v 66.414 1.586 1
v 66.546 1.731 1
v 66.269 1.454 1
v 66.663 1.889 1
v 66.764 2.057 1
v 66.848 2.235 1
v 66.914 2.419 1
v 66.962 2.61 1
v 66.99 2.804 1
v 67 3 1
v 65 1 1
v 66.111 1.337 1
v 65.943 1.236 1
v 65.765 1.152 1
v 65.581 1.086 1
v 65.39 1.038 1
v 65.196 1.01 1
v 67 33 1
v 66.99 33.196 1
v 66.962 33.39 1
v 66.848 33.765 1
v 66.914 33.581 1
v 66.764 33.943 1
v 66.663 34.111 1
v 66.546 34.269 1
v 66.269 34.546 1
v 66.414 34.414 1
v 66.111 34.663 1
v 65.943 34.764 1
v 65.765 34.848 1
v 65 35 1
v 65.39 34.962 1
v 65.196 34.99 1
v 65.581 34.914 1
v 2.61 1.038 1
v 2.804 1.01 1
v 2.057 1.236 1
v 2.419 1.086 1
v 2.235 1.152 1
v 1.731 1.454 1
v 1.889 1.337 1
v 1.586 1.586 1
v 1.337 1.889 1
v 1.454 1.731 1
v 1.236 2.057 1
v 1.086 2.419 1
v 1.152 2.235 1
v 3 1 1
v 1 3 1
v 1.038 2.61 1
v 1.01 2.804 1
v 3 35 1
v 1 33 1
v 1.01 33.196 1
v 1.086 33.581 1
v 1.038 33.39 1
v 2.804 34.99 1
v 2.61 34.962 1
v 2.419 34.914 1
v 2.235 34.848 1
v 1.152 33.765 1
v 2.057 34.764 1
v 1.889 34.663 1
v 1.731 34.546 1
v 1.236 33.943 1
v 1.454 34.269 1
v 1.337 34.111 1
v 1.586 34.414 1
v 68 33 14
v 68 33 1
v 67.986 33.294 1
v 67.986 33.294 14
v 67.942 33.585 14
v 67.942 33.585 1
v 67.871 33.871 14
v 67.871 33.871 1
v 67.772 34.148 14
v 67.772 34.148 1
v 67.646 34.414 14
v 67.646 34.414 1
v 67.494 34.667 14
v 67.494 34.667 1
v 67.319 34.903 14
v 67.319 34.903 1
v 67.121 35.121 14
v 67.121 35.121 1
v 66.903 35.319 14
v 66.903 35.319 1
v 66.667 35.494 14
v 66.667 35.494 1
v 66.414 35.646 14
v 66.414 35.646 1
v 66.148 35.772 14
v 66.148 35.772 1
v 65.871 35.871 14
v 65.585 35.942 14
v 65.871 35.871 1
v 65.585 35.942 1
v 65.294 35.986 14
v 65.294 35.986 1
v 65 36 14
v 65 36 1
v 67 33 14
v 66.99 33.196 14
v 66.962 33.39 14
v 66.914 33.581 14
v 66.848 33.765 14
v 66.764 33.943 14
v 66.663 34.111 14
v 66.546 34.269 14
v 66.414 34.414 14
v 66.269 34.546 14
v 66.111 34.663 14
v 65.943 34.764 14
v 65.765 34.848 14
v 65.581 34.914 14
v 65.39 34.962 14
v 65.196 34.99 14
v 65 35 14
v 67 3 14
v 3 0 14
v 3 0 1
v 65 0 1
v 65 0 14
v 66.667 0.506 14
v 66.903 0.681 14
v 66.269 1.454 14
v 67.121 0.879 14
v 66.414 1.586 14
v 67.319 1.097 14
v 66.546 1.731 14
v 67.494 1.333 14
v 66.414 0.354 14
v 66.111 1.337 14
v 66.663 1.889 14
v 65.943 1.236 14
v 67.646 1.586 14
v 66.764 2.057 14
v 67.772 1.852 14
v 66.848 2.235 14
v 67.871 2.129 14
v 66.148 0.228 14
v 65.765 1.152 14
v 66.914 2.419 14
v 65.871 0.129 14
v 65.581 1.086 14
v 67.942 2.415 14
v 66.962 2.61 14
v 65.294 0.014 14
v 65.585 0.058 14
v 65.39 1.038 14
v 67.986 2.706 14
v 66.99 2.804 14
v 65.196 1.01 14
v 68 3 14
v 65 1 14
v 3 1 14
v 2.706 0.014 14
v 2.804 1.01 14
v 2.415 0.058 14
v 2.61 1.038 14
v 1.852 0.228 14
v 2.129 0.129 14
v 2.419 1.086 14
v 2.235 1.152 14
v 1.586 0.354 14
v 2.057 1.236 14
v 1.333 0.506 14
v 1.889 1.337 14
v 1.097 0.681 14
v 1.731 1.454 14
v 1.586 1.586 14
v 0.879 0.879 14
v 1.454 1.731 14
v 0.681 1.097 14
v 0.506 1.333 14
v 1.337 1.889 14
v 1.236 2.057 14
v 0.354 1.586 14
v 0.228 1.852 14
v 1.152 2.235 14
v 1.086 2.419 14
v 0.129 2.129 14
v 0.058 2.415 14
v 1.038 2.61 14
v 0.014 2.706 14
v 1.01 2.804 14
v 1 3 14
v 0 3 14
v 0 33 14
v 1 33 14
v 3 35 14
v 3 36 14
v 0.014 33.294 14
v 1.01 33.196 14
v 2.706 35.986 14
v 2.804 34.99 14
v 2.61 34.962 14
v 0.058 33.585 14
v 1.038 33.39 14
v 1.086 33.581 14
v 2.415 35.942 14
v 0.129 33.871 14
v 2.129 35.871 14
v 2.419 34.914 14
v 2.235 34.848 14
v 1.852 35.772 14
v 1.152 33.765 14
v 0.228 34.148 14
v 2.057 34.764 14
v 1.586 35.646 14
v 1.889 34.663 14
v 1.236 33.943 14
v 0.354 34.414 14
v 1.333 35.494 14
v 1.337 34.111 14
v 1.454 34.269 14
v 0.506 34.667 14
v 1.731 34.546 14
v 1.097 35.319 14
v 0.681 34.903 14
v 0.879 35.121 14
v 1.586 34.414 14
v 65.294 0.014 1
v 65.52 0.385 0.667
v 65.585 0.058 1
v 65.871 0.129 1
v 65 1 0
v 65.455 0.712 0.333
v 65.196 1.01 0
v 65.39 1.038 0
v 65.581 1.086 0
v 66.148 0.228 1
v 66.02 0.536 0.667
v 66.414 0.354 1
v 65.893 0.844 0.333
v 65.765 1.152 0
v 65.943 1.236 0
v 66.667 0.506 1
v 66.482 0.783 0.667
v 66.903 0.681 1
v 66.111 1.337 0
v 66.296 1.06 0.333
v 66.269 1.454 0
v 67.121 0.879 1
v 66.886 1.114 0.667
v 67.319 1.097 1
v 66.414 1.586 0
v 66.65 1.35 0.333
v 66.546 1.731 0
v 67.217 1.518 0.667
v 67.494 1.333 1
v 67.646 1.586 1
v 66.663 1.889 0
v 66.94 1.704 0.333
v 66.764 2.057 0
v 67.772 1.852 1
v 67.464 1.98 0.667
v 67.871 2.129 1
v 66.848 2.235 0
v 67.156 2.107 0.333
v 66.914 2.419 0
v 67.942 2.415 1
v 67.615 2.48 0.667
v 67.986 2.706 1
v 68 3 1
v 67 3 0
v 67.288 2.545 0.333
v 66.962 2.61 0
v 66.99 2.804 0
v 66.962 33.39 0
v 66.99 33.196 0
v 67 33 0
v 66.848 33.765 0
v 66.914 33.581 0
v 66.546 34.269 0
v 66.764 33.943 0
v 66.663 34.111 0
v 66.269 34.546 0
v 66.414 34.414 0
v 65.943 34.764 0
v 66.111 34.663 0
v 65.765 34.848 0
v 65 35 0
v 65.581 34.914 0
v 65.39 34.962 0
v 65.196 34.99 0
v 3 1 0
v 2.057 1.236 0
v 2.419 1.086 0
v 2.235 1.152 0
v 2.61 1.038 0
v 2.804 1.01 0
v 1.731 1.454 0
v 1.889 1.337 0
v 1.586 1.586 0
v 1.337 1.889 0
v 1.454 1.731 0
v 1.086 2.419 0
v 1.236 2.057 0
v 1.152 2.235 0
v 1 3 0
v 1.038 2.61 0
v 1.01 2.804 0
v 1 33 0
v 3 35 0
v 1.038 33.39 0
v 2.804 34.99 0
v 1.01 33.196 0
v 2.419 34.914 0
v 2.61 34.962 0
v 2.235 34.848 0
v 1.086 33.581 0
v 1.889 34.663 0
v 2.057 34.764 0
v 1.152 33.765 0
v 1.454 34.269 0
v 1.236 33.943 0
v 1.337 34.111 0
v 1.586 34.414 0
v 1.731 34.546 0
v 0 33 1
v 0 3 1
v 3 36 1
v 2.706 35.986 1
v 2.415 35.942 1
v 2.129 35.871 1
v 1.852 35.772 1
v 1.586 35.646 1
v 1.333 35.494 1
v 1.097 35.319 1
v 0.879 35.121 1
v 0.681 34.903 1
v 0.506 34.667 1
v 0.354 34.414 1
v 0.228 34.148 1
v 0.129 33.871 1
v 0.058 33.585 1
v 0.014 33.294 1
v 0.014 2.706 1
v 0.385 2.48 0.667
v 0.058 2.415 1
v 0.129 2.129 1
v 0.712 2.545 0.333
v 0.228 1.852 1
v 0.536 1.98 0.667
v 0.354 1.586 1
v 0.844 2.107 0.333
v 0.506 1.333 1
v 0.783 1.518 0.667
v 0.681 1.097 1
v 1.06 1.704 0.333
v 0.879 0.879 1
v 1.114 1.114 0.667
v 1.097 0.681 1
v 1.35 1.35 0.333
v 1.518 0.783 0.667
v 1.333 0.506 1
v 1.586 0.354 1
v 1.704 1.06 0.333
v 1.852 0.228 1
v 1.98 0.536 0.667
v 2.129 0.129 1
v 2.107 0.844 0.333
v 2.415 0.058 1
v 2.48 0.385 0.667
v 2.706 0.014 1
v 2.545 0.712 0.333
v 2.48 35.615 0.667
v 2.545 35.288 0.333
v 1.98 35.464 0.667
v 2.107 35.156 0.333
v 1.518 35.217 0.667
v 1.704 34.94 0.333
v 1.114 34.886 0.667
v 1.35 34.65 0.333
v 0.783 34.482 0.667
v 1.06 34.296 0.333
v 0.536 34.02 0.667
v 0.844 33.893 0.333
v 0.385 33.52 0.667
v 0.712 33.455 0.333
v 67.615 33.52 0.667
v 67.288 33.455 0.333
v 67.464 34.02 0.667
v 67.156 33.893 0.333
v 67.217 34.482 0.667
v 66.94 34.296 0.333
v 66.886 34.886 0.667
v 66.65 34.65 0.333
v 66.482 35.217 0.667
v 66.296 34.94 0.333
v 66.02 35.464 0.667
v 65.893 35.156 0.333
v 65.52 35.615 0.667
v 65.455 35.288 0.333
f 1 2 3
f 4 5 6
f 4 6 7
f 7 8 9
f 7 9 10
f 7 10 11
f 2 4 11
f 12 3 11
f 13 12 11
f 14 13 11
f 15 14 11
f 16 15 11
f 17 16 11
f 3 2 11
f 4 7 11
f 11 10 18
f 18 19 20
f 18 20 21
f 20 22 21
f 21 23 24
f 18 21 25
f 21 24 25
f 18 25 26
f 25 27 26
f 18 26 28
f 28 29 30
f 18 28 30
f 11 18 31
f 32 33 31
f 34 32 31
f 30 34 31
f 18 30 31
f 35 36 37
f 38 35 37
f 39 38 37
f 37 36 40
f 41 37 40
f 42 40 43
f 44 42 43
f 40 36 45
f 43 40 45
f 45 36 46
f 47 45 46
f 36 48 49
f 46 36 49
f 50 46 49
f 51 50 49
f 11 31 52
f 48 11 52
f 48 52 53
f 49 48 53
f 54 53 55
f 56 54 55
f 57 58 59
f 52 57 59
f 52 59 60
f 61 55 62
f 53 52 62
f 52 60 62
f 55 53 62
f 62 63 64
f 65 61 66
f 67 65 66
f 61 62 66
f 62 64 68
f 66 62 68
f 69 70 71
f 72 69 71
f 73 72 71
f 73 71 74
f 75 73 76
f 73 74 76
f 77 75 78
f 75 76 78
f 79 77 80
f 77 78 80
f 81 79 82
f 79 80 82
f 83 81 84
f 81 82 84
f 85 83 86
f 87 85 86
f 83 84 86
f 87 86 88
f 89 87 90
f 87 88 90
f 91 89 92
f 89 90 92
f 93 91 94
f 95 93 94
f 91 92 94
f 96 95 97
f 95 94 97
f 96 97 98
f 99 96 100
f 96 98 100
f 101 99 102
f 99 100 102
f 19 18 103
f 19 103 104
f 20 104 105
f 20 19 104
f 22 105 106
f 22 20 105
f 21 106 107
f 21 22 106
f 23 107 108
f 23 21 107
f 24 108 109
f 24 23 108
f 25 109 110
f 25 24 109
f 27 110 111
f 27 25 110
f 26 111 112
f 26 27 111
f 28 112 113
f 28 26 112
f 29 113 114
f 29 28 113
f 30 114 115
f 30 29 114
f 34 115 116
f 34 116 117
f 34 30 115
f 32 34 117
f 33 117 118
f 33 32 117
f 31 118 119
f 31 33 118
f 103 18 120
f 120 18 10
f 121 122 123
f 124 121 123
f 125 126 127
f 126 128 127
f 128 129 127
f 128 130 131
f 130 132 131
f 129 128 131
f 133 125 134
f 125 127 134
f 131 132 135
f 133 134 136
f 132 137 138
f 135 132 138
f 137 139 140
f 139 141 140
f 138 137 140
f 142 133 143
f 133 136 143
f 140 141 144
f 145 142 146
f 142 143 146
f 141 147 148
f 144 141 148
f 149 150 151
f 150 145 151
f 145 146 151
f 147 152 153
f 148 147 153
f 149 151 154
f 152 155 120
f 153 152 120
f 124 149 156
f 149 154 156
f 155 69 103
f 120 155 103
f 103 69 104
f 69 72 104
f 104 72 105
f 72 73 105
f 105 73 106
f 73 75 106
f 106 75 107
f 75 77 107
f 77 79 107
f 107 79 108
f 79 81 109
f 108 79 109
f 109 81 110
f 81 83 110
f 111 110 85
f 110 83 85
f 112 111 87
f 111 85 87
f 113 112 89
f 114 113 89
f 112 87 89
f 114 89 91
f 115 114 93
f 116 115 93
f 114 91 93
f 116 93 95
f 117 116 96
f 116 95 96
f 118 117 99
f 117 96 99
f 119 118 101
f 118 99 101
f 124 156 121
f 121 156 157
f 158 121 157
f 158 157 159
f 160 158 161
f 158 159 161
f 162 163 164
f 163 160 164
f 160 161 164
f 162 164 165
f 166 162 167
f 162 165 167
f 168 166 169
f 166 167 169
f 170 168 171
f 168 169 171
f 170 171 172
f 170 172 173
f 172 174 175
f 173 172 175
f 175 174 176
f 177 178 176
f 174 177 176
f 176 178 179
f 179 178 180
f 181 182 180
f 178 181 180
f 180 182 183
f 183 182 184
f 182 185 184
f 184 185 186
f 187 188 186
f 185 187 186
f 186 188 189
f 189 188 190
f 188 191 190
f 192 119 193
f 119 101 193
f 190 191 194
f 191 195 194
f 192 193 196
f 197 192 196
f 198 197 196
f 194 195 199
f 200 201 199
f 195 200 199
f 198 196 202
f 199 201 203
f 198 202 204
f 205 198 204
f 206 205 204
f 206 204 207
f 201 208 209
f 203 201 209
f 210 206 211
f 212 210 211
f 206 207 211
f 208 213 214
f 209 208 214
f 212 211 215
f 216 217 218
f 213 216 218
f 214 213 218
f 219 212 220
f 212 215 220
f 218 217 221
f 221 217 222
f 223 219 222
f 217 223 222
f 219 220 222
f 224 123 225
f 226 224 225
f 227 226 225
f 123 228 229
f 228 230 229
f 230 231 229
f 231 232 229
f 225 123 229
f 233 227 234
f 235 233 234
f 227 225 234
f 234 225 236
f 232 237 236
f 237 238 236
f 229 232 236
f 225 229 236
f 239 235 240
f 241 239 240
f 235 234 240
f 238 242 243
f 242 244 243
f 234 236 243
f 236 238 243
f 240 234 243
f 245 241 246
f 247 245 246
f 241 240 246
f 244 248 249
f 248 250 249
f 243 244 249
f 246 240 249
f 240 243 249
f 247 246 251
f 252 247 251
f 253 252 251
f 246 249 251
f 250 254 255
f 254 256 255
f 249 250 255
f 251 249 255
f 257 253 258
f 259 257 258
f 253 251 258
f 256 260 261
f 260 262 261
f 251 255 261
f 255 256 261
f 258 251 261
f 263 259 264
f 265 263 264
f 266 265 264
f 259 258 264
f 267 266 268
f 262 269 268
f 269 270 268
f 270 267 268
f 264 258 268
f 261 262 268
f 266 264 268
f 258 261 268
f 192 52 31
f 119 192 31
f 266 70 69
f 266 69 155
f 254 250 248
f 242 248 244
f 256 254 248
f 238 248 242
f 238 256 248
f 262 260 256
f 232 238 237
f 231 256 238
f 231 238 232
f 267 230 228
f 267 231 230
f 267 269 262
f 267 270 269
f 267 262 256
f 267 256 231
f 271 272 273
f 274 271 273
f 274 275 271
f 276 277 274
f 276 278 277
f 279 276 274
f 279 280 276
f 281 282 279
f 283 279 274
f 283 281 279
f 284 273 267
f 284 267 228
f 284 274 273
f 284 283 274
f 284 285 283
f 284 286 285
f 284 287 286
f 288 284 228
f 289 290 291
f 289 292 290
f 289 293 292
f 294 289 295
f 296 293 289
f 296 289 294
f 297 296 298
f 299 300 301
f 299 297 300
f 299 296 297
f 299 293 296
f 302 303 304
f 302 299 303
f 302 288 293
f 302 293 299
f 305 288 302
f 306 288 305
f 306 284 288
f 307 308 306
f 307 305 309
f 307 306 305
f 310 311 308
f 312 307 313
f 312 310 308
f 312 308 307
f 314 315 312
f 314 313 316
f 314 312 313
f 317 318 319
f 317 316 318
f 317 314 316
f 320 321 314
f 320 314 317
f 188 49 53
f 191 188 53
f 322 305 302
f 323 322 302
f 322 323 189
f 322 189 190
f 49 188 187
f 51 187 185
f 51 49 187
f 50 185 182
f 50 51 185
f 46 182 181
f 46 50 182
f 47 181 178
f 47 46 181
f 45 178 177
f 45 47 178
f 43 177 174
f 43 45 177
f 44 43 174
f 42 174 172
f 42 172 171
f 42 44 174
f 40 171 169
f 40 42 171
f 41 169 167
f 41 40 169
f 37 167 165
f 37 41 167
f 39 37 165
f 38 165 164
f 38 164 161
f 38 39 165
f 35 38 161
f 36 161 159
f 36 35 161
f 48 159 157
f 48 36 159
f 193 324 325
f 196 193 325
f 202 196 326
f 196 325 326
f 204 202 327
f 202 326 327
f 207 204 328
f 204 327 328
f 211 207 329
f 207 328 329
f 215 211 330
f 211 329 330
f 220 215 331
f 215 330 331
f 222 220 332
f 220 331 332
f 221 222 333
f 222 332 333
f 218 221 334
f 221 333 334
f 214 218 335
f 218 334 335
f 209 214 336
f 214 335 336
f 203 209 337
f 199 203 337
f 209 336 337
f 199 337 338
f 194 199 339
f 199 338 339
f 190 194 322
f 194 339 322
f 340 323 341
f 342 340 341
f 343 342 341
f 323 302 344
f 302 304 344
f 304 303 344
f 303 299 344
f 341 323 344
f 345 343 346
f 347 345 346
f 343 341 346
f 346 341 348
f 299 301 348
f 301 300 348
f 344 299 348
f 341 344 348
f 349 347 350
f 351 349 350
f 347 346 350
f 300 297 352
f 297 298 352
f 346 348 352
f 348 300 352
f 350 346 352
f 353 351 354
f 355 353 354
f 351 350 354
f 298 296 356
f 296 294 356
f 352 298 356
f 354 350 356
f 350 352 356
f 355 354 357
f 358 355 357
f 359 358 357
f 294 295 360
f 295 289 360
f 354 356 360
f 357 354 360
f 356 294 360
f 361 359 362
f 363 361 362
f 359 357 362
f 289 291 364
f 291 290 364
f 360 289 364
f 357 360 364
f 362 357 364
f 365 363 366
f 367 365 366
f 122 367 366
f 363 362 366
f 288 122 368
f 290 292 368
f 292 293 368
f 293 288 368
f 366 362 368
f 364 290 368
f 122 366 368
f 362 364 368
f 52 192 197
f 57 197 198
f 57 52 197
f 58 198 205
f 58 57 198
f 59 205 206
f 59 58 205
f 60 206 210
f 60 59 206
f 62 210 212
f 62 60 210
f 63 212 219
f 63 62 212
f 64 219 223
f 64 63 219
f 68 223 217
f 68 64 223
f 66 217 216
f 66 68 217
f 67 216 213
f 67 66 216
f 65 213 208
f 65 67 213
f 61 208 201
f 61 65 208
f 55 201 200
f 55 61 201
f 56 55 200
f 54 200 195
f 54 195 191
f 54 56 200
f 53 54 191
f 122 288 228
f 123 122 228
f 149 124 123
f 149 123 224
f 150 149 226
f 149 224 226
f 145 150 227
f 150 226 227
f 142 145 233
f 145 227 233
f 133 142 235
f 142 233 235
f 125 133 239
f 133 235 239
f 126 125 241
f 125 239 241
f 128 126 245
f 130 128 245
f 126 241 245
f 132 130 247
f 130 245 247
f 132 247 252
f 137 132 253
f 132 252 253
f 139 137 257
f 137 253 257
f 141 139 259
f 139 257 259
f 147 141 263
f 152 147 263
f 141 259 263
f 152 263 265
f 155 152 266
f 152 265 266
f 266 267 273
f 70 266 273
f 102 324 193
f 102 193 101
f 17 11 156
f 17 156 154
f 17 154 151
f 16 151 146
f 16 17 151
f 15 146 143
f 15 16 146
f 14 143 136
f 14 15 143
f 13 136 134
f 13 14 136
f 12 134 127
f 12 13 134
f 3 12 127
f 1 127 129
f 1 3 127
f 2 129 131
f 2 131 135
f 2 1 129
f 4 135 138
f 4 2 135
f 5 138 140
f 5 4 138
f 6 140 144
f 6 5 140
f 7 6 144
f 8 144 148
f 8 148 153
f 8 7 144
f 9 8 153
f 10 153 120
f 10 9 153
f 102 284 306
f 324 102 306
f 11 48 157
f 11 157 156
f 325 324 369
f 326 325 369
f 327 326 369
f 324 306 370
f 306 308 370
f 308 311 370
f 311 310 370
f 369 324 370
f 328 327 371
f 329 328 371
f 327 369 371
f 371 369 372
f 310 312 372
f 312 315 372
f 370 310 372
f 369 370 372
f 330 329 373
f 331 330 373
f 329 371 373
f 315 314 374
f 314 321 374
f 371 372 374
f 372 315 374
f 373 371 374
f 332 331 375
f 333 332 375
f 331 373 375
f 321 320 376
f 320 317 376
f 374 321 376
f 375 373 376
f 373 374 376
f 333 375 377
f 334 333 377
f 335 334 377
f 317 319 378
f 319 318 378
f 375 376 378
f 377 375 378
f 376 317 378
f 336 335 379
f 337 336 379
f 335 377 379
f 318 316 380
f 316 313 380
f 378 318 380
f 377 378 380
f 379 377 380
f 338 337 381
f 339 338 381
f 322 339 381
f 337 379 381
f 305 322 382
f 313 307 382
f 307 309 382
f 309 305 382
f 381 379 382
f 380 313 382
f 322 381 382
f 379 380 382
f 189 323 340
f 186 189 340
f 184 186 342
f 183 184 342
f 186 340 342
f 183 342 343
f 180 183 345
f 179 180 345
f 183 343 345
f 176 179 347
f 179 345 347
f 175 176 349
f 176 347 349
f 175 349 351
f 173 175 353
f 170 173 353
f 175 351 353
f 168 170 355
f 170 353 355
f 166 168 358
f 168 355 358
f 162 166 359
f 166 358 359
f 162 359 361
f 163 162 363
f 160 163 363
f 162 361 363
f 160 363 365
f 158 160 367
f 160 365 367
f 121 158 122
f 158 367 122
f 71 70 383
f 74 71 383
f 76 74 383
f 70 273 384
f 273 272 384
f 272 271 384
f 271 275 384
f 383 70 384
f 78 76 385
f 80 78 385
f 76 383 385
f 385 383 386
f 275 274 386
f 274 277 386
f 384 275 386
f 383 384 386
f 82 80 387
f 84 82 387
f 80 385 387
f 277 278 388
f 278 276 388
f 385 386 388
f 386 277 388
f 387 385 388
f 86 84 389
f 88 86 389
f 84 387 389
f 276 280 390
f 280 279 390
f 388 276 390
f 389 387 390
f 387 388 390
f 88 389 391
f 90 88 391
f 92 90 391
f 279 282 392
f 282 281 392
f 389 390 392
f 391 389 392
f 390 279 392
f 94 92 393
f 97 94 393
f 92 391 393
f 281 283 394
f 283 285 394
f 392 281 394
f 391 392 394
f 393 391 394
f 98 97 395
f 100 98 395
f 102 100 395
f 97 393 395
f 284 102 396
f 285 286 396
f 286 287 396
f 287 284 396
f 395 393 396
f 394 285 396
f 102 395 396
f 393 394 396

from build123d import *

# Parameters (mm, degrees)
PAD_DEPTH    = 14
THICKNESS_T  = -1
CHAMFER_SIZE = 1


with BuildPart() as part:
    # Sketch → Pad (new body)
    with BuildSketch(Plane.XY):
        with BuildLine():
            Line((0, 3), (0, 33))
            ThreePointArc((3, 36), (0.87868, 35.12132), (0, 33))
            Line((3, 36), (65, 36))
            ThreePointArc((68, 33), (67.12132, 35.12132), (65, 36))
            Line((68, 33), (68, 3))
            ThreePointArc((65, 0), (67.12132, 0.87868), (68, 3))
            Line((3, 0), (65, 0))
            ThreePointArc((0, 3), (0.87868, 0.87868), (3, 0))
        make_face()
    extrude(amount=PAD_DEPTH)

    # Thickness
    thickness_openings = [part.faces().sort_by_distance(p)[0] for p in [
        (34, 18, 14),
    ]]
    offset(amount=THICKNESS_T, openings=thickness_openings)

    # Chamfer
    chamfer_edges = [part.edges().sort_by_distance(p)[0] for p in [
        (34, 0, 0),
    ]]
    chamfer(chamfer_edges, length=CHAMFER_SIZE)


solid = part.part
